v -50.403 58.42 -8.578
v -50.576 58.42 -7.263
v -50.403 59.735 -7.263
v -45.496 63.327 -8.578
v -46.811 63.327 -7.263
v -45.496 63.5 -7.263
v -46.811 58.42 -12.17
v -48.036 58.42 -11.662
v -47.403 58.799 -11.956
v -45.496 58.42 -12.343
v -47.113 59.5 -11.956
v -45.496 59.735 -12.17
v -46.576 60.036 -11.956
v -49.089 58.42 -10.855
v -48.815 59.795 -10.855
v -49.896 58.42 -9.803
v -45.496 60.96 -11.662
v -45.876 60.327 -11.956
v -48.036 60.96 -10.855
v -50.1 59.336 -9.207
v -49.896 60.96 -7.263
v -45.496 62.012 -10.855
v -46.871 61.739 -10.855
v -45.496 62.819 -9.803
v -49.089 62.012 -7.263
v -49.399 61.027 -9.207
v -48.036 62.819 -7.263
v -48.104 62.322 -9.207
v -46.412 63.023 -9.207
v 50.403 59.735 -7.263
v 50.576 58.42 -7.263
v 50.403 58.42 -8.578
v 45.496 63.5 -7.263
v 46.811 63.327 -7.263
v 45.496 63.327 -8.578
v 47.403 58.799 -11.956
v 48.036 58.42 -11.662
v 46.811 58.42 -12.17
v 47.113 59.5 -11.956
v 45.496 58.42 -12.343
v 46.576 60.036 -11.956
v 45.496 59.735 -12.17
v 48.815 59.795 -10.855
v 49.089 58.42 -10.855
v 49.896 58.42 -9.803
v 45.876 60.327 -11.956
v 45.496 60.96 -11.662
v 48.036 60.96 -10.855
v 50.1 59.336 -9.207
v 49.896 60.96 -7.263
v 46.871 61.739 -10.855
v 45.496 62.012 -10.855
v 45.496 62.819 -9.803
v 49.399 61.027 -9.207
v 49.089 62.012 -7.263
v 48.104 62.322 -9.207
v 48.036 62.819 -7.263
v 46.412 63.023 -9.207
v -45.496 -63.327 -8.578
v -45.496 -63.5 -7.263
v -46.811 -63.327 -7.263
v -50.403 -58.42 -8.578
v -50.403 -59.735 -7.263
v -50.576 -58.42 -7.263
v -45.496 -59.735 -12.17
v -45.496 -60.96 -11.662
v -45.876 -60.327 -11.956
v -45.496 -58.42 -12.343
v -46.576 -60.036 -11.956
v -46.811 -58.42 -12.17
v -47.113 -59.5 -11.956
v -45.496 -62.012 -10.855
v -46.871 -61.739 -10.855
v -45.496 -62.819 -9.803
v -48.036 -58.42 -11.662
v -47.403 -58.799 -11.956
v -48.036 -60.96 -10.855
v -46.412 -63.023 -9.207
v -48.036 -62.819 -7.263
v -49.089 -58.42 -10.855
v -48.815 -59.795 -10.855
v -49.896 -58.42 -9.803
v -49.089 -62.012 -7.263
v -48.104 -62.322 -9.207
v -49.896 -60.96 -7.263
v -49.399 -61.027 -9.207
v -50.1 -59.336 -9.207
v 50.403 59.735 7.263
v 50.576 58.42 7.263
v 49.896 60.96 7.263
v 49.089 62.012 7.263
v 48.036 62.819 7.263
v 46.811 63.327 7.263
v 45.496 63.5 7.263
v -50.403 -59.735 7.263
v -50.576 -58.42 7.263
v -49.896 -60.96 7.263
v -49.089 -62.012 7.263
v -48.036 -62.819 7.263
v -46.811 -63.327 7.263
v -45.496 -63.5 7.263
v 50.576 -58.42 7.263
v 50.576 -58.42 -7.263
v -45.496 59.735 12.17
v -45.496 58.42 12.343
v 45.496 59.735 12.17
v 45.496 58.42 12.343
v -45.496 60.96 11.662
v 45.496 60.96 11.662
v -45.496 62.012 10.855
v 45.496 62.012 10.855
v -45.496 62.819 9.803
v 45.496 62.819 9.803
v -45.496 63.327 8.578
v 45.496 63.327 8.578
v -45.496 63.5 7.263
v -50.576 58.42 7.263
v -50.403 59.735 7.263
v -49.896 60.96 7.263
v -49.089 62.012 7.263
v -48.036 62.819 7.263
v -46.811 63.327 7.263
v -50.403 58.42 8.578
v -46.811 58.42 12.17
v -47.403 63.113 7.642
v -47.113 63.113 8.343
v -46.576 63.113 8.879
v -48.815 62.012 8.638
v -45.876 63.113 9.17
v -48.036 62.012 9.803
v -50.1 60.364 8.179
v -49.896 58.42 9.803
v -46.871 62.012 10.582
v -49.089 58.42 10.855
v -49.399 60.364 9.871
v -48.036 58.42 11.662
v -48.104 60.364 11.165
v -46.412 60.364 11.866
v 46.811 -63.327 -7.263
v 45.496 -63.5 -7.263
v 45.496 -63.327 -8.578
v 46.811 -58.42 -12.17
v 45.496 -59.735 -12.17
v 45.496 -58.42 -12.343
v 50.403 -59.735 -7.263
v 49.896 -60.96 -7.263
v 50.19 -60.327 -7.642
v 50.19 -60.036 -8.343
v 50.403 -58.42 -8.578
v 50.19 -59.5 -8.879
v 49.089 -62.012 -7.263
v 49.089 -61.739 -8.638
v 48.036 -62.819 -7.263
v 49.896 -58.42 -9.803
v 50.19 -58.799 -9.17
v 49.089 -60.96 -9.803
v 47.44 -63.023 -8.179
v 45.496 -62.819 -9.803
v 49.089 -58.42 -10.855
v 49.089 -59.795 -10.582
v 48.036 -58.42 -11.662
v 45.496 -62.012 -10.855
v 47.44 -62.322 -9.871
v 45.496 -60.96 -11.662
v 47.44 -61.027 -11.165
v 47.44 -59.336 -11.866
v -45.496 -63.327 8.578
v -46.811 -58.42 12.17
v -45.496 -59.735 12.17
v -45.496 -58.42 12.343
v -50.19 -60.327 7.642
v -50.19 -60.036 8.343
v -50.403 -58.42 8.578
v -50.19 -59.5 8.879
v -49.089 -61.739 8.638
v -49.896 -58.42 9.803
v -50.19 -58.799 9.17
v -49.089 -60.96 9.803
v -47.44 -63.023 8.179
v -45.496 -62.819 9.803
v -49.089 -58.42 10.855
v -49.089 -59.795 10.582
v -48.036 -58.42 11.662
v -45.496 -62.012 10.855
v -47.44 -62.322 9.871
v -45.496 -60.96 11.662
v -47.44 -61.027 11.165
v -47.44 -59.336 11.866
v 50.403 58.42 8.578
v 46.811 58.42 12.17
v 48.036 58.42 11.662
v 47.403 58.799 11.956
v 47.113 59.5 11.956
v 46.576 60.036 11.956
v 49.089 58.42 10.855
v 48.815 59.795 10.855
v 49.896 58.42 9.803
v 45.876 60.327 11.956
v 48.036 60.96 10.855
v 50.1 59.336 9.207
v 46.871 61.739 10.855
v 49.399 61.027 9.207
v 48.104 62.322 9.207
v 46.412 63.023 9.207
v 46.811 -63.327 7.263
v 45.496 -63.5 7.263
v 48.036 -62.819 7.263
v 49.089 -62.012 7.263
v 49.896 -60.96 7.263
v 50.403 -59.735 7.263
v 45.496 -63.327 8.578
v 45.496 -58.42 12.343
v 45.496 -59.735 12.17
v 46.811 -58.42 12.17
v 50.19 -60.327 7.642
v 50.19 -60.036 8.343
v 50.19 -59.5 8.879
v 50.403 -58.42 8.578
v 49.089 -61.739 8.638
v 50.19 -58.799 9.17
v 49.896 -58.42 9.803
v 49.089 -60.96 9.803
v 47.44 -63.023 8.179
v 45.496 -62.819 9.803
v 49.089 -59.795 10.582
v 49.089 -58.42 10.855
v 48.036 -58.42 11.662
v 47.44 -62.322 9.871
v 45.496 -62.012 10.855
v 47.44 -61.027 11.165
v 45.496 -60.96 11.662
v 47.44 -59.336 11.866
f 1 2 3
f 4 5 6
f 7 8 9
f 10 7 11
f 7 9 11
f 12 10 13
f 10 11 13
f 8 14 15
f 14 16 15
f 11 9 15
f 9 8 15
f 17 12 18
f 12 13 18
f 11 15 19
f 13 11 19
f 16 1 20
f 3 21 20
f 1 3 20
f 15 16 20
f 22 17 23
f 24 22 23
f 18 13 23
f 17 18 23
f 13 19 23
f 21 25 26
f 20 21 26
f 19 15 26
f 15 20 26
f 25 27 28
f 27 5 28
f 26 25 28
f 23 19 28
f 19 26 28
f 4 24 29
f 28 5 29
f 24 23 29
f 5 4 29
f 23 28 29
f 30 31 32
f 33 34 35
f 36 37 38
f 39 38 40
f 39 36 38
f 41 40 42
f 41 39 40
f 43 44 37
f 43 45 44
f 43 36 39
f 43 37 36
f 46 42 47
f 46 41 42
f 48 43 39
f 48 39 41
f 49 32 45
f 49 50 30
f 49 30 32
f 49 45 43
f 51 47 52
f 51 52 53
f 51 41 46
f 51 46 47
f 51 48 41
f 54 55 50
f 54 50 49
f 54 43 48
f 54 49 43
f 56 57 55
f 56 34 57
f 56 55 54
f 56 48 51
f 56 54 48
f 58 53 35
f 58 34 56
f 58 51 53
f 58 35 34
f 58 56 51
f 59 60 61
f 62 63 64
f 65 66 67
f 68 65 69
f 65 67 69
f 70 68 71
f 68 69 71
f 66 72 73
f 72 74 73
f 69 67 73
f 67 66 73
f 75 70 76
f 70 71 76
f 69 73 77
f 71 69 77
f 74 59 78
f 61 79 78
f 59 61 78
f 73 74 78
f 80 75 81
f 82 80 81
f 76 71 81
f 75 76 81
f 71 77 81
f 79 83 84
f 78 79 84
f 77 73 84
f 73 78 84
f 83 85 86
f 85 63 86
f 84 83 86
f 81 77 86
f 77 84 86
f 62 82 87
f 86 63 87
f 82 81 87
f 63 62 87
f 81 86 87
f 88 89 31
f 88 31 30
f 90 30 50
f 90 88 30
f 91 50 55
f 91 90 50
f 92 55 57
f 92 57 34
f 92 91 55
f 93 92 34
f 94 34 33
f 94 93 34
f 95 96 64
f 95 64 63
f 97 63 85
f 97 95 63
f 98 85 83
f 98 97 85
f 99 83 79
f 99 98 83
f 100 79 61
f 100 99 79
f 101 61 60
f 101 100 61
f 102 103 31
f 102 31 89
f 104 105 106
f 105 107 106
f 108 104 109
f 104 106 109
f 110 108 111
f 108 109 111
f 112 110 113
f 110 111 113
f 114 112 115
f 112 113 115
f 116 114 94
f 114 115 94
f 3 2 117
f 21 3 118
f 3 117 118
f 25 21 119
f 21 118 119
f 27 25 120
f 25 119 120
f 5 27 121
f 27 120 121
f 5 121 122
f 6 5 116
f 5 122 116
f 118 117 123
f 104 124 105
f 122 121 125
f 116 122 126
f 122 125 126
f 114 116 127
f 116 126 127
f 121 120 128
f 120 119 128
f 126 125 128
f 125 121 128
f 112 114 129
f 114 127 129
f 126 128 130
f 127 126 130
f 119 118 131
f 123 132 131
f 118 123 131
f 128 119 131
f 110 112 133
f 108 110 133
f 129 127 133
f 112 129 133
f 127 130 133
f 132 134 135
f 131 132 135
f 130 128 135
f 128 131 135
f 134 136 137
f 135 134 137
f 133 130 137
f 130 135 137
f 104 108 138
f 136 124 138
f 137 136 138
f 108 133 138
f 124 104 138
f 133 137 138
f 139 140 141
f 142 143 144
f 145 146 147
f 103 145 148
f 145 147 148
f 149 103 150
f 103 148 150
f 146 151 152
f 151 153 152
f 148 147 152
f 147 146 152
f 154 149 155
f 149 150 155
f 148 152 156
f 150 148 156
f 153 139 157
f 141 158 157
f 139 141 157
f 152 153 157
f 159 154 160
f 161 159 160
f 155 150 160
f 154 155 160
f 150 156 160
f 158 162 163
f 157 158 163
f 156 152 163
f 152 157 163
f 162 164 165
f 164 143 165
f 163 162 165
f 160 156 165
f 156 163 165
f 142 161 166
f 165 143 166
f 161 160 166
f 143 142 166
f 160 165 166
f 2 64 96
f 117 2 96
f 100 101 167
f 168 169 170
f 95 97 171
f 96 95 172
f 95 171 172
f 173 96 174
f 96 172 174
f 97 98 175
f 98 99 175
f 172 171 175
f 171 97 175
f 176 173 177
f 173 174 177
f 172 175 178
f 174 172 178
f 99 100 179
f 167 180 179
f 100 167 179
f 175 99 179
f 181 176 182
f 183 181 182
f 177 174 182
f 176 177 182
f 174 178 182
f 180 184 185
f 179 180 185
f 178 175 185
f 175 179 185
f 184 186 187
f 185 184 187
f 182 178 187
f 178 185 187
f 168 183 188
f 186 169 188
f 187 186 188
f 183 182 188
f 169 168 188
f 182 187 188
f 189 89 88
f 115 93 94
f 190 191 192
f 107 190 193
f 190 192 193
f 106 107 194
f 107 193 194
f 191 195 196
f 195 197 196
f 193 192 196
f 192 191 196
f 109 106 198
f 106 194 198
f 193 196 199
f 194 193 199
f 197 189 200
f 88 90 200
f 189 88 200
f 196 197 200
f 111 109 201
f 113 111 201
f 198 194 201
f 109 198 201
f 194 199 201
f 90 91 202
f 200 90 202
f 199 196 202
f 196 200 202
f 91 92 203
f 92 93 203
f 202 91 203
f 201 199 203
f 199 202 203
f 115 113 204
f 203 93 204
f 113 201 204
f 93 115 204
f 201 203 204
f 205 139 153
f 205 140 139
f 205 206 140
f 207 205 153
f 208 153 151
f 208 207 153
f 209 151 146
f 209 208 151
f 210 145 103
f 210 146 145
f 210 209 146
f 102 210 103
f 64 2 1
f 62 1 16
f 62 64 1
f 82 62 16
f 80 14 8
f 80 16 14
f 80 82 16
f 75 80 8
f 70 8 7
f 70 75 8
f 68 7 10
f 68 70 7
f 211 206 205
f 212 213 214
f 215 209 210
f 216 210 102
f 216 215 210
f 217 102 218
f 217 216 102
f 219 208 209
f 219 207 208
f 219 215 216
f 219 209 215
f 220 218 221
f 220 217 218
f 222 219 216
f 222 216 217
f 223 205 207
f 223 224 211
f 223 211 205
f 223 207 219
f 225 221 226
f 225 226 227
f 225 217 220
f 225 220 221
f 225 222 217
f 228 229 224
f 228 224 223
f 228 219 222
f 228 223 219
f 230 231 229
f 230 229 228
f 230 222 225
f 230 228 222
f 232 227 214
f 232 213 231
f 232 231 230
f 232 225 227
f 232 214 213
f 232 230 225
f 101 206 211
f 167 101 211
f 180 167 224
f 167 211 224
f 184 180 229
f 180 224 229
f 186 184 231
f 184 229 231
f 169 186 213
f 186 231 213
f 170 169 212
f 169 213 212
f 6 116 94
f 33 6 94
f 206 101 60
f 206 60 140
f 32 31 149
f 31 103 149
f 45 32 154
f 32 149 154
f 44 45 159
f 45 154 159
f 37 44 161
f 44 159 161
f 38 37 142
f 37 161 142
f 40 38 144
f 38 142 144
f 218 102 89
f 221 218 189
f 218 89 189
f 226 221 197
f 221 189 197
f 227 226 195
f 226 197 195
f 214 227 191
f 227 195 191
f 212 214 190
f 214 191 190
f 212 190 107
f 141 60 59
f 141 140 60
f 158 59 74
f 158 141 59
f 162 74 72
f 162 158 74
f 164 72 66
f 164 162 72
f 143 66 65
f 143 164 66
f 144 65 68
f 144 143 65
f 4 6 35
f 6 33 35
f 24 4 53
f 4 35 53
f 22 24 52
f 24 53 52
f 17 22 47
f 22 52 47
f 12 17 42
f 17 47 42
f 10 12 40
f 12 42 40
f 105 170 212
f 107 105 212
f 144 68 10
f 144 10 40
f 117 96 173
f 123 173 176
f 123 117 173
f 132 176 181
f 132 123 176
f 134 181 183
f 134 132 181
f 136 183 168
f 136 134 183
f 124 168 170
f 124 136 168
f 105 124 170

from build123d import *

# Parameters (mm, degrees)
F0_W     = 101.1528596282
F0_H     = 24.6861185879
F1_DEPTH = 63.5
F2_R     = 5.08


# Not quite as in the source:
# - a feature names something its author has since deleted; it is built from what else it names


with BuildPart() as f1:
    # F0 (on Front) → F1 (new body, symmetric)
    with BuildSketch(Plane.XZ):
        Rectangle(F0_W, F0_H)
    extrude(amount=F1_DEPTH, both=True)

    # F2
    f2_edges = [f1.edges().sort_by_distance(p)[0] for p in [
        (0, -63.5, 12.343059),
        (-50.57643, -63.5, 0),
        (0, -63.5, -12.343059),
        (50.57643, -63.5, 0),
        (50.57643, 63.5, 0),
        (50.57643, 0, 12.343059),
        (50.57643, 0, -12.343059),
        (-50.57643, 0, 12.343059),
        (-50.57643, 63.5, 0),
        (-50.57643, 0, -12.343059),
        (0, 63.5, 12.343059),
        (0, 63.5, -12.343059),
    ]]
    fillet(f2_edges, radius=F2_R)


solid = f1.part
